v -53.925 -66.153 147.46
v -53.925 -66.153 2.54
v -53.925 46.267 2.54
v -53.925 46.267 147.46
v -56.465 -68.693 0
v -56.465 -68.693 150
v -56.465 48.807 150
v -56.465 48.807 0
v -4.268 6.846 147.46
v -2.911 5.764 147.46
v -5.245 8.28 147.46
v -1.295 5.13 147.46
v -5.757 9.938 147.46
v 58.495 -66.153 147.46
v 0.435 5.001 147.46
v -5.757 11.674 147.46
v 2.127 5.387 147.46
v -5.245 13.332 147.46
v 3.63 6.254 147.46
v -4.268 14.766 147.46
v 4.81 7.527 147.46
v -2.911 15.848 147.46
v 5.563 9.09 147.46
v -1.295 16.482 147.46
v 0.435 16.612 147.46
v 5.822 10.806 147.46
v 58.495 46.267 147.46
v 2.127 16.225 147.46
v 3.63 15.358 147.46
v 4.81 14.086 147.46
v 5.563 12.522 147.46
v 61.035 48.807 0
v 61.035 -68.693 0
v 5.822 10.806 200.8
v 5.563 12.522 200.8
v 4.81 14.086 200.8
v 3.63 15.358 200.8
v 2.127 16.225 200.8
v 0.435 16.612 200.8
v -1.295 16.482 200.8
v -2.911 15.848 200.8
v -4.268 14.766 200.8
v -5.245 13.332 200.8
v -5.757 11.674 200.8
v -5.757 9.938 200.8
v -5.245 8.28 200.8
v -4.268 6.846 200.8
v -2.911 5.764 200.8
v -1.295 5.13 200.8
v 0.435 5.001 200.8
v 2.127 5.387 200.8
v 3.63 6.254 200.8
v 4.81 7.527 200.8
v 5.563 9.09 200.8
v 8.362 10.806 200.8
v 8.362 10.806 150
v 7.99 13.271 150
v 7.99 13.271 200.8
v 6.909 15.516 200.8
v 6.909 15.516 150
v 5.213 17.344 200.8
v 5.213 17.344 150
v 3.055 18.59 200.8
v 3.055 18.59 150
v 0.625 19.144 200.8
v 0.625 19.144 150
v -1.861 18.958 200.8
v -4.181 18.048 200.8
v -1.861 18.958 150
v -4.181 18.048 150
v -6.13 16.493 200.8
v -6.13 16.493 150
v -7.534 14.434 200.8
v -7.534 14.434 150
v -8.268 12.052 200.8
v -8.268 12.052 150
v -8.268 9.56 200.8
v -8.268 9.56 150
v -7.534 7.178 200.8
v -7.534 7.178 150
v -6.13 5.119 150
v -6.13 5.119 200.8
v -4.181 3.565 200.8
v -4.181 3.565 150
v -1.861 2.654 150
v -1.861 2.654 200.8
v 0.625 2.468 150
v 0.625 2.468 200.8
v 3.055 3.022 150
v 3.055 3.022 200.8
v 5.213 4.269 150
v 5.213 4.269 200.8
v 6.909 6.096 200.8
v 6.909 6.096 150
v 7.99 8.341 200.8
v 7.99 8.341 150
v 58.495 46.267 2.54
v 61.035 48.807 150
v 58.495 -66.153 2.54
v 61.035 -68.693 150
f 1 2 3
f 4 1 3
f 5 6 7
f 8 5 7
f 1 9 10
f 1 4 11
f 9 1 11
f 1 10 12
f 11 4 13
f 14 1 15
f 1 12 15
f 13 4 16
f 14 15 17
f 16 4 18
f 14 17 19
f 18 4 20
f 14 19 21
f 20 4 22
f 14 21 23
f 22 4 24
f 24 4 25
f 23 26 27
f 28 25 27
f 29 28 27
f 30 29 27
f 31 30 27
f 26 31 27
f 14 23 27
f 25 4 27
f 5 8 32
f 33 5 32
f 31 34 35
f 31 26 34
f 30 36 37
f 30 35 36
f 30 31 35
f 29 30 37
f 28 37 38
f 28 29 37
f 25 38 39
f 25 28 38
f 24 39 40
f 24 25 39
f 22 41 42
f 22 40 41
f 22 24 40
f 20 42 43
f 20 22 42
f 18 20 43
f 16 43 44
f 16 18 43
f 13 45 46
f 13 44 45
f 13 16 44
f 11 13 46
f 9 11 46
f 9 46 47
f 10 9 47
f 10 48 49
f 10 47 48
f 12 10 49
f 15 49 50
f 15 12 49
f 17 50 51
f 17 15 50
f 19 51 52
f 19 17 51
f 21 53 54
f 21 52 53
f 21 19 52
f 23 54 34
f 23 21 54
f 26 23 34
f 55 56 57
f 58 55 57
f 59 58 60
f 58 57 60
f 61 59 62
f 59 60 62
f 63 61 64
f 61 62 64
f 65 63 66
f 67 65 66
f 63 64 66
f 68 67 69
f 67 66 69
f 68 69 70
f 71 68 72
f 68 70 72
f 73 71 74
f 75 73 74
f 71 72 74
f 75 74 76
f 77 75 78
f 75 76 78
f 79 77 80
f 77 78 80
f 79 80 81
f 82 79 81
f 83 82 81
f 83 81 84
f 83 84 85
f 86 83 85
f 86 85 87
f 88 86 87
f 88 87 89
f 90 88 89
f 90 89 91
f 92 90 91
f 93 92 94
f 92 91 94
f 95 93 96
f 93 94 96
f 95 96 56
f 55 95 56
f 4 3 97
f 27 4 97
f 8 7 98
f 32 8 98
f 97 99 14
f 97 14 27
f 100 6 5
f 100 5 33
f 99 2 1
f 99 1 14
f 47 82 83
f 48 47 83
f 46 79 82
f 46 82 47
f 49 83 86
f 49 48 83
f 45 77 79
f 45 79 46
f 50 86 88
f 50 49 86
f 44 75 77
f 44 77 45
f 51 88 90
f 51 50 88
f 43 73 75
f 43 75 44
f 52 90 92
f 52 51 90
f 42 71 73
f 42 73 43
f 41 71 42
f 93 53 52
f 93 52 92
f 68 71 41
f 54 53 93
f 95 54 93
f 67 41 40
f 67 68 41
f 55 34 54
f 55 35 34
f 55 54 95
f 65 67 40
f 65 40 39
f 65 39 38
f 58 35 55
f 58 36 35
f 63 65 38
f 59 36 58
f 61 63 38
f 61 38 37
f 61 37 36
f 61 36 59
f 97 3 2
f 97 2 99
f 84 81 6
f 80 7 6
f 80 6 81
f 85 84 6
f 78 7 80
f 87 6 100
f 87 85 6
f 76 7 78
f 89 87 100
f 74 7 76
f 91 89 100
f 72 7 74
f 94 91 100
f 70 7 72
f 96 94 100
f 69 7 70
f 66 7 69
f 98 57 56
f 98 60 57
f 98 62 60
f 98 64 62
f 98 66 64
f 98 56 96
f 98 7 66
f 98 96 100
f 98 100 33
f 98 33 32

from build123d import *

# Parameters (mm, degrees)
F0_W     = 117.5
F0_H     = 117.5
F1_DEPTH = 150
F2_R     = 8.3617608376
F3_DEPTH = 50.8
F4_T     = -2.54


with BuildPart() as f1:
    # F0 (on Top) → F1 (new body)
    with BuildSketch(Plane.XY):
        with Locations((2.2854433954, -9.9431091547)):
            Rectangle(F0_W, F0_H)
    extrude(amount=F1_DEPTH)

    # F2 (on face) → F3 (join)
    with BuildSketch(Plane.XY.offset(150)):
        with Locations((0, 10.8060371131)):
            Circle(F2_R)
    extrude(amount=F3_DEPTH)

    # F4
    f4_openings = [f1.faces().sort_by_distance(p)[0] for p in [
        (0, 10.806037, 200.8),
    ]]
    offset(amount=F4_T, openings=f4_openings, kind=Kind.INTERSECTION)


solid = f1.part
